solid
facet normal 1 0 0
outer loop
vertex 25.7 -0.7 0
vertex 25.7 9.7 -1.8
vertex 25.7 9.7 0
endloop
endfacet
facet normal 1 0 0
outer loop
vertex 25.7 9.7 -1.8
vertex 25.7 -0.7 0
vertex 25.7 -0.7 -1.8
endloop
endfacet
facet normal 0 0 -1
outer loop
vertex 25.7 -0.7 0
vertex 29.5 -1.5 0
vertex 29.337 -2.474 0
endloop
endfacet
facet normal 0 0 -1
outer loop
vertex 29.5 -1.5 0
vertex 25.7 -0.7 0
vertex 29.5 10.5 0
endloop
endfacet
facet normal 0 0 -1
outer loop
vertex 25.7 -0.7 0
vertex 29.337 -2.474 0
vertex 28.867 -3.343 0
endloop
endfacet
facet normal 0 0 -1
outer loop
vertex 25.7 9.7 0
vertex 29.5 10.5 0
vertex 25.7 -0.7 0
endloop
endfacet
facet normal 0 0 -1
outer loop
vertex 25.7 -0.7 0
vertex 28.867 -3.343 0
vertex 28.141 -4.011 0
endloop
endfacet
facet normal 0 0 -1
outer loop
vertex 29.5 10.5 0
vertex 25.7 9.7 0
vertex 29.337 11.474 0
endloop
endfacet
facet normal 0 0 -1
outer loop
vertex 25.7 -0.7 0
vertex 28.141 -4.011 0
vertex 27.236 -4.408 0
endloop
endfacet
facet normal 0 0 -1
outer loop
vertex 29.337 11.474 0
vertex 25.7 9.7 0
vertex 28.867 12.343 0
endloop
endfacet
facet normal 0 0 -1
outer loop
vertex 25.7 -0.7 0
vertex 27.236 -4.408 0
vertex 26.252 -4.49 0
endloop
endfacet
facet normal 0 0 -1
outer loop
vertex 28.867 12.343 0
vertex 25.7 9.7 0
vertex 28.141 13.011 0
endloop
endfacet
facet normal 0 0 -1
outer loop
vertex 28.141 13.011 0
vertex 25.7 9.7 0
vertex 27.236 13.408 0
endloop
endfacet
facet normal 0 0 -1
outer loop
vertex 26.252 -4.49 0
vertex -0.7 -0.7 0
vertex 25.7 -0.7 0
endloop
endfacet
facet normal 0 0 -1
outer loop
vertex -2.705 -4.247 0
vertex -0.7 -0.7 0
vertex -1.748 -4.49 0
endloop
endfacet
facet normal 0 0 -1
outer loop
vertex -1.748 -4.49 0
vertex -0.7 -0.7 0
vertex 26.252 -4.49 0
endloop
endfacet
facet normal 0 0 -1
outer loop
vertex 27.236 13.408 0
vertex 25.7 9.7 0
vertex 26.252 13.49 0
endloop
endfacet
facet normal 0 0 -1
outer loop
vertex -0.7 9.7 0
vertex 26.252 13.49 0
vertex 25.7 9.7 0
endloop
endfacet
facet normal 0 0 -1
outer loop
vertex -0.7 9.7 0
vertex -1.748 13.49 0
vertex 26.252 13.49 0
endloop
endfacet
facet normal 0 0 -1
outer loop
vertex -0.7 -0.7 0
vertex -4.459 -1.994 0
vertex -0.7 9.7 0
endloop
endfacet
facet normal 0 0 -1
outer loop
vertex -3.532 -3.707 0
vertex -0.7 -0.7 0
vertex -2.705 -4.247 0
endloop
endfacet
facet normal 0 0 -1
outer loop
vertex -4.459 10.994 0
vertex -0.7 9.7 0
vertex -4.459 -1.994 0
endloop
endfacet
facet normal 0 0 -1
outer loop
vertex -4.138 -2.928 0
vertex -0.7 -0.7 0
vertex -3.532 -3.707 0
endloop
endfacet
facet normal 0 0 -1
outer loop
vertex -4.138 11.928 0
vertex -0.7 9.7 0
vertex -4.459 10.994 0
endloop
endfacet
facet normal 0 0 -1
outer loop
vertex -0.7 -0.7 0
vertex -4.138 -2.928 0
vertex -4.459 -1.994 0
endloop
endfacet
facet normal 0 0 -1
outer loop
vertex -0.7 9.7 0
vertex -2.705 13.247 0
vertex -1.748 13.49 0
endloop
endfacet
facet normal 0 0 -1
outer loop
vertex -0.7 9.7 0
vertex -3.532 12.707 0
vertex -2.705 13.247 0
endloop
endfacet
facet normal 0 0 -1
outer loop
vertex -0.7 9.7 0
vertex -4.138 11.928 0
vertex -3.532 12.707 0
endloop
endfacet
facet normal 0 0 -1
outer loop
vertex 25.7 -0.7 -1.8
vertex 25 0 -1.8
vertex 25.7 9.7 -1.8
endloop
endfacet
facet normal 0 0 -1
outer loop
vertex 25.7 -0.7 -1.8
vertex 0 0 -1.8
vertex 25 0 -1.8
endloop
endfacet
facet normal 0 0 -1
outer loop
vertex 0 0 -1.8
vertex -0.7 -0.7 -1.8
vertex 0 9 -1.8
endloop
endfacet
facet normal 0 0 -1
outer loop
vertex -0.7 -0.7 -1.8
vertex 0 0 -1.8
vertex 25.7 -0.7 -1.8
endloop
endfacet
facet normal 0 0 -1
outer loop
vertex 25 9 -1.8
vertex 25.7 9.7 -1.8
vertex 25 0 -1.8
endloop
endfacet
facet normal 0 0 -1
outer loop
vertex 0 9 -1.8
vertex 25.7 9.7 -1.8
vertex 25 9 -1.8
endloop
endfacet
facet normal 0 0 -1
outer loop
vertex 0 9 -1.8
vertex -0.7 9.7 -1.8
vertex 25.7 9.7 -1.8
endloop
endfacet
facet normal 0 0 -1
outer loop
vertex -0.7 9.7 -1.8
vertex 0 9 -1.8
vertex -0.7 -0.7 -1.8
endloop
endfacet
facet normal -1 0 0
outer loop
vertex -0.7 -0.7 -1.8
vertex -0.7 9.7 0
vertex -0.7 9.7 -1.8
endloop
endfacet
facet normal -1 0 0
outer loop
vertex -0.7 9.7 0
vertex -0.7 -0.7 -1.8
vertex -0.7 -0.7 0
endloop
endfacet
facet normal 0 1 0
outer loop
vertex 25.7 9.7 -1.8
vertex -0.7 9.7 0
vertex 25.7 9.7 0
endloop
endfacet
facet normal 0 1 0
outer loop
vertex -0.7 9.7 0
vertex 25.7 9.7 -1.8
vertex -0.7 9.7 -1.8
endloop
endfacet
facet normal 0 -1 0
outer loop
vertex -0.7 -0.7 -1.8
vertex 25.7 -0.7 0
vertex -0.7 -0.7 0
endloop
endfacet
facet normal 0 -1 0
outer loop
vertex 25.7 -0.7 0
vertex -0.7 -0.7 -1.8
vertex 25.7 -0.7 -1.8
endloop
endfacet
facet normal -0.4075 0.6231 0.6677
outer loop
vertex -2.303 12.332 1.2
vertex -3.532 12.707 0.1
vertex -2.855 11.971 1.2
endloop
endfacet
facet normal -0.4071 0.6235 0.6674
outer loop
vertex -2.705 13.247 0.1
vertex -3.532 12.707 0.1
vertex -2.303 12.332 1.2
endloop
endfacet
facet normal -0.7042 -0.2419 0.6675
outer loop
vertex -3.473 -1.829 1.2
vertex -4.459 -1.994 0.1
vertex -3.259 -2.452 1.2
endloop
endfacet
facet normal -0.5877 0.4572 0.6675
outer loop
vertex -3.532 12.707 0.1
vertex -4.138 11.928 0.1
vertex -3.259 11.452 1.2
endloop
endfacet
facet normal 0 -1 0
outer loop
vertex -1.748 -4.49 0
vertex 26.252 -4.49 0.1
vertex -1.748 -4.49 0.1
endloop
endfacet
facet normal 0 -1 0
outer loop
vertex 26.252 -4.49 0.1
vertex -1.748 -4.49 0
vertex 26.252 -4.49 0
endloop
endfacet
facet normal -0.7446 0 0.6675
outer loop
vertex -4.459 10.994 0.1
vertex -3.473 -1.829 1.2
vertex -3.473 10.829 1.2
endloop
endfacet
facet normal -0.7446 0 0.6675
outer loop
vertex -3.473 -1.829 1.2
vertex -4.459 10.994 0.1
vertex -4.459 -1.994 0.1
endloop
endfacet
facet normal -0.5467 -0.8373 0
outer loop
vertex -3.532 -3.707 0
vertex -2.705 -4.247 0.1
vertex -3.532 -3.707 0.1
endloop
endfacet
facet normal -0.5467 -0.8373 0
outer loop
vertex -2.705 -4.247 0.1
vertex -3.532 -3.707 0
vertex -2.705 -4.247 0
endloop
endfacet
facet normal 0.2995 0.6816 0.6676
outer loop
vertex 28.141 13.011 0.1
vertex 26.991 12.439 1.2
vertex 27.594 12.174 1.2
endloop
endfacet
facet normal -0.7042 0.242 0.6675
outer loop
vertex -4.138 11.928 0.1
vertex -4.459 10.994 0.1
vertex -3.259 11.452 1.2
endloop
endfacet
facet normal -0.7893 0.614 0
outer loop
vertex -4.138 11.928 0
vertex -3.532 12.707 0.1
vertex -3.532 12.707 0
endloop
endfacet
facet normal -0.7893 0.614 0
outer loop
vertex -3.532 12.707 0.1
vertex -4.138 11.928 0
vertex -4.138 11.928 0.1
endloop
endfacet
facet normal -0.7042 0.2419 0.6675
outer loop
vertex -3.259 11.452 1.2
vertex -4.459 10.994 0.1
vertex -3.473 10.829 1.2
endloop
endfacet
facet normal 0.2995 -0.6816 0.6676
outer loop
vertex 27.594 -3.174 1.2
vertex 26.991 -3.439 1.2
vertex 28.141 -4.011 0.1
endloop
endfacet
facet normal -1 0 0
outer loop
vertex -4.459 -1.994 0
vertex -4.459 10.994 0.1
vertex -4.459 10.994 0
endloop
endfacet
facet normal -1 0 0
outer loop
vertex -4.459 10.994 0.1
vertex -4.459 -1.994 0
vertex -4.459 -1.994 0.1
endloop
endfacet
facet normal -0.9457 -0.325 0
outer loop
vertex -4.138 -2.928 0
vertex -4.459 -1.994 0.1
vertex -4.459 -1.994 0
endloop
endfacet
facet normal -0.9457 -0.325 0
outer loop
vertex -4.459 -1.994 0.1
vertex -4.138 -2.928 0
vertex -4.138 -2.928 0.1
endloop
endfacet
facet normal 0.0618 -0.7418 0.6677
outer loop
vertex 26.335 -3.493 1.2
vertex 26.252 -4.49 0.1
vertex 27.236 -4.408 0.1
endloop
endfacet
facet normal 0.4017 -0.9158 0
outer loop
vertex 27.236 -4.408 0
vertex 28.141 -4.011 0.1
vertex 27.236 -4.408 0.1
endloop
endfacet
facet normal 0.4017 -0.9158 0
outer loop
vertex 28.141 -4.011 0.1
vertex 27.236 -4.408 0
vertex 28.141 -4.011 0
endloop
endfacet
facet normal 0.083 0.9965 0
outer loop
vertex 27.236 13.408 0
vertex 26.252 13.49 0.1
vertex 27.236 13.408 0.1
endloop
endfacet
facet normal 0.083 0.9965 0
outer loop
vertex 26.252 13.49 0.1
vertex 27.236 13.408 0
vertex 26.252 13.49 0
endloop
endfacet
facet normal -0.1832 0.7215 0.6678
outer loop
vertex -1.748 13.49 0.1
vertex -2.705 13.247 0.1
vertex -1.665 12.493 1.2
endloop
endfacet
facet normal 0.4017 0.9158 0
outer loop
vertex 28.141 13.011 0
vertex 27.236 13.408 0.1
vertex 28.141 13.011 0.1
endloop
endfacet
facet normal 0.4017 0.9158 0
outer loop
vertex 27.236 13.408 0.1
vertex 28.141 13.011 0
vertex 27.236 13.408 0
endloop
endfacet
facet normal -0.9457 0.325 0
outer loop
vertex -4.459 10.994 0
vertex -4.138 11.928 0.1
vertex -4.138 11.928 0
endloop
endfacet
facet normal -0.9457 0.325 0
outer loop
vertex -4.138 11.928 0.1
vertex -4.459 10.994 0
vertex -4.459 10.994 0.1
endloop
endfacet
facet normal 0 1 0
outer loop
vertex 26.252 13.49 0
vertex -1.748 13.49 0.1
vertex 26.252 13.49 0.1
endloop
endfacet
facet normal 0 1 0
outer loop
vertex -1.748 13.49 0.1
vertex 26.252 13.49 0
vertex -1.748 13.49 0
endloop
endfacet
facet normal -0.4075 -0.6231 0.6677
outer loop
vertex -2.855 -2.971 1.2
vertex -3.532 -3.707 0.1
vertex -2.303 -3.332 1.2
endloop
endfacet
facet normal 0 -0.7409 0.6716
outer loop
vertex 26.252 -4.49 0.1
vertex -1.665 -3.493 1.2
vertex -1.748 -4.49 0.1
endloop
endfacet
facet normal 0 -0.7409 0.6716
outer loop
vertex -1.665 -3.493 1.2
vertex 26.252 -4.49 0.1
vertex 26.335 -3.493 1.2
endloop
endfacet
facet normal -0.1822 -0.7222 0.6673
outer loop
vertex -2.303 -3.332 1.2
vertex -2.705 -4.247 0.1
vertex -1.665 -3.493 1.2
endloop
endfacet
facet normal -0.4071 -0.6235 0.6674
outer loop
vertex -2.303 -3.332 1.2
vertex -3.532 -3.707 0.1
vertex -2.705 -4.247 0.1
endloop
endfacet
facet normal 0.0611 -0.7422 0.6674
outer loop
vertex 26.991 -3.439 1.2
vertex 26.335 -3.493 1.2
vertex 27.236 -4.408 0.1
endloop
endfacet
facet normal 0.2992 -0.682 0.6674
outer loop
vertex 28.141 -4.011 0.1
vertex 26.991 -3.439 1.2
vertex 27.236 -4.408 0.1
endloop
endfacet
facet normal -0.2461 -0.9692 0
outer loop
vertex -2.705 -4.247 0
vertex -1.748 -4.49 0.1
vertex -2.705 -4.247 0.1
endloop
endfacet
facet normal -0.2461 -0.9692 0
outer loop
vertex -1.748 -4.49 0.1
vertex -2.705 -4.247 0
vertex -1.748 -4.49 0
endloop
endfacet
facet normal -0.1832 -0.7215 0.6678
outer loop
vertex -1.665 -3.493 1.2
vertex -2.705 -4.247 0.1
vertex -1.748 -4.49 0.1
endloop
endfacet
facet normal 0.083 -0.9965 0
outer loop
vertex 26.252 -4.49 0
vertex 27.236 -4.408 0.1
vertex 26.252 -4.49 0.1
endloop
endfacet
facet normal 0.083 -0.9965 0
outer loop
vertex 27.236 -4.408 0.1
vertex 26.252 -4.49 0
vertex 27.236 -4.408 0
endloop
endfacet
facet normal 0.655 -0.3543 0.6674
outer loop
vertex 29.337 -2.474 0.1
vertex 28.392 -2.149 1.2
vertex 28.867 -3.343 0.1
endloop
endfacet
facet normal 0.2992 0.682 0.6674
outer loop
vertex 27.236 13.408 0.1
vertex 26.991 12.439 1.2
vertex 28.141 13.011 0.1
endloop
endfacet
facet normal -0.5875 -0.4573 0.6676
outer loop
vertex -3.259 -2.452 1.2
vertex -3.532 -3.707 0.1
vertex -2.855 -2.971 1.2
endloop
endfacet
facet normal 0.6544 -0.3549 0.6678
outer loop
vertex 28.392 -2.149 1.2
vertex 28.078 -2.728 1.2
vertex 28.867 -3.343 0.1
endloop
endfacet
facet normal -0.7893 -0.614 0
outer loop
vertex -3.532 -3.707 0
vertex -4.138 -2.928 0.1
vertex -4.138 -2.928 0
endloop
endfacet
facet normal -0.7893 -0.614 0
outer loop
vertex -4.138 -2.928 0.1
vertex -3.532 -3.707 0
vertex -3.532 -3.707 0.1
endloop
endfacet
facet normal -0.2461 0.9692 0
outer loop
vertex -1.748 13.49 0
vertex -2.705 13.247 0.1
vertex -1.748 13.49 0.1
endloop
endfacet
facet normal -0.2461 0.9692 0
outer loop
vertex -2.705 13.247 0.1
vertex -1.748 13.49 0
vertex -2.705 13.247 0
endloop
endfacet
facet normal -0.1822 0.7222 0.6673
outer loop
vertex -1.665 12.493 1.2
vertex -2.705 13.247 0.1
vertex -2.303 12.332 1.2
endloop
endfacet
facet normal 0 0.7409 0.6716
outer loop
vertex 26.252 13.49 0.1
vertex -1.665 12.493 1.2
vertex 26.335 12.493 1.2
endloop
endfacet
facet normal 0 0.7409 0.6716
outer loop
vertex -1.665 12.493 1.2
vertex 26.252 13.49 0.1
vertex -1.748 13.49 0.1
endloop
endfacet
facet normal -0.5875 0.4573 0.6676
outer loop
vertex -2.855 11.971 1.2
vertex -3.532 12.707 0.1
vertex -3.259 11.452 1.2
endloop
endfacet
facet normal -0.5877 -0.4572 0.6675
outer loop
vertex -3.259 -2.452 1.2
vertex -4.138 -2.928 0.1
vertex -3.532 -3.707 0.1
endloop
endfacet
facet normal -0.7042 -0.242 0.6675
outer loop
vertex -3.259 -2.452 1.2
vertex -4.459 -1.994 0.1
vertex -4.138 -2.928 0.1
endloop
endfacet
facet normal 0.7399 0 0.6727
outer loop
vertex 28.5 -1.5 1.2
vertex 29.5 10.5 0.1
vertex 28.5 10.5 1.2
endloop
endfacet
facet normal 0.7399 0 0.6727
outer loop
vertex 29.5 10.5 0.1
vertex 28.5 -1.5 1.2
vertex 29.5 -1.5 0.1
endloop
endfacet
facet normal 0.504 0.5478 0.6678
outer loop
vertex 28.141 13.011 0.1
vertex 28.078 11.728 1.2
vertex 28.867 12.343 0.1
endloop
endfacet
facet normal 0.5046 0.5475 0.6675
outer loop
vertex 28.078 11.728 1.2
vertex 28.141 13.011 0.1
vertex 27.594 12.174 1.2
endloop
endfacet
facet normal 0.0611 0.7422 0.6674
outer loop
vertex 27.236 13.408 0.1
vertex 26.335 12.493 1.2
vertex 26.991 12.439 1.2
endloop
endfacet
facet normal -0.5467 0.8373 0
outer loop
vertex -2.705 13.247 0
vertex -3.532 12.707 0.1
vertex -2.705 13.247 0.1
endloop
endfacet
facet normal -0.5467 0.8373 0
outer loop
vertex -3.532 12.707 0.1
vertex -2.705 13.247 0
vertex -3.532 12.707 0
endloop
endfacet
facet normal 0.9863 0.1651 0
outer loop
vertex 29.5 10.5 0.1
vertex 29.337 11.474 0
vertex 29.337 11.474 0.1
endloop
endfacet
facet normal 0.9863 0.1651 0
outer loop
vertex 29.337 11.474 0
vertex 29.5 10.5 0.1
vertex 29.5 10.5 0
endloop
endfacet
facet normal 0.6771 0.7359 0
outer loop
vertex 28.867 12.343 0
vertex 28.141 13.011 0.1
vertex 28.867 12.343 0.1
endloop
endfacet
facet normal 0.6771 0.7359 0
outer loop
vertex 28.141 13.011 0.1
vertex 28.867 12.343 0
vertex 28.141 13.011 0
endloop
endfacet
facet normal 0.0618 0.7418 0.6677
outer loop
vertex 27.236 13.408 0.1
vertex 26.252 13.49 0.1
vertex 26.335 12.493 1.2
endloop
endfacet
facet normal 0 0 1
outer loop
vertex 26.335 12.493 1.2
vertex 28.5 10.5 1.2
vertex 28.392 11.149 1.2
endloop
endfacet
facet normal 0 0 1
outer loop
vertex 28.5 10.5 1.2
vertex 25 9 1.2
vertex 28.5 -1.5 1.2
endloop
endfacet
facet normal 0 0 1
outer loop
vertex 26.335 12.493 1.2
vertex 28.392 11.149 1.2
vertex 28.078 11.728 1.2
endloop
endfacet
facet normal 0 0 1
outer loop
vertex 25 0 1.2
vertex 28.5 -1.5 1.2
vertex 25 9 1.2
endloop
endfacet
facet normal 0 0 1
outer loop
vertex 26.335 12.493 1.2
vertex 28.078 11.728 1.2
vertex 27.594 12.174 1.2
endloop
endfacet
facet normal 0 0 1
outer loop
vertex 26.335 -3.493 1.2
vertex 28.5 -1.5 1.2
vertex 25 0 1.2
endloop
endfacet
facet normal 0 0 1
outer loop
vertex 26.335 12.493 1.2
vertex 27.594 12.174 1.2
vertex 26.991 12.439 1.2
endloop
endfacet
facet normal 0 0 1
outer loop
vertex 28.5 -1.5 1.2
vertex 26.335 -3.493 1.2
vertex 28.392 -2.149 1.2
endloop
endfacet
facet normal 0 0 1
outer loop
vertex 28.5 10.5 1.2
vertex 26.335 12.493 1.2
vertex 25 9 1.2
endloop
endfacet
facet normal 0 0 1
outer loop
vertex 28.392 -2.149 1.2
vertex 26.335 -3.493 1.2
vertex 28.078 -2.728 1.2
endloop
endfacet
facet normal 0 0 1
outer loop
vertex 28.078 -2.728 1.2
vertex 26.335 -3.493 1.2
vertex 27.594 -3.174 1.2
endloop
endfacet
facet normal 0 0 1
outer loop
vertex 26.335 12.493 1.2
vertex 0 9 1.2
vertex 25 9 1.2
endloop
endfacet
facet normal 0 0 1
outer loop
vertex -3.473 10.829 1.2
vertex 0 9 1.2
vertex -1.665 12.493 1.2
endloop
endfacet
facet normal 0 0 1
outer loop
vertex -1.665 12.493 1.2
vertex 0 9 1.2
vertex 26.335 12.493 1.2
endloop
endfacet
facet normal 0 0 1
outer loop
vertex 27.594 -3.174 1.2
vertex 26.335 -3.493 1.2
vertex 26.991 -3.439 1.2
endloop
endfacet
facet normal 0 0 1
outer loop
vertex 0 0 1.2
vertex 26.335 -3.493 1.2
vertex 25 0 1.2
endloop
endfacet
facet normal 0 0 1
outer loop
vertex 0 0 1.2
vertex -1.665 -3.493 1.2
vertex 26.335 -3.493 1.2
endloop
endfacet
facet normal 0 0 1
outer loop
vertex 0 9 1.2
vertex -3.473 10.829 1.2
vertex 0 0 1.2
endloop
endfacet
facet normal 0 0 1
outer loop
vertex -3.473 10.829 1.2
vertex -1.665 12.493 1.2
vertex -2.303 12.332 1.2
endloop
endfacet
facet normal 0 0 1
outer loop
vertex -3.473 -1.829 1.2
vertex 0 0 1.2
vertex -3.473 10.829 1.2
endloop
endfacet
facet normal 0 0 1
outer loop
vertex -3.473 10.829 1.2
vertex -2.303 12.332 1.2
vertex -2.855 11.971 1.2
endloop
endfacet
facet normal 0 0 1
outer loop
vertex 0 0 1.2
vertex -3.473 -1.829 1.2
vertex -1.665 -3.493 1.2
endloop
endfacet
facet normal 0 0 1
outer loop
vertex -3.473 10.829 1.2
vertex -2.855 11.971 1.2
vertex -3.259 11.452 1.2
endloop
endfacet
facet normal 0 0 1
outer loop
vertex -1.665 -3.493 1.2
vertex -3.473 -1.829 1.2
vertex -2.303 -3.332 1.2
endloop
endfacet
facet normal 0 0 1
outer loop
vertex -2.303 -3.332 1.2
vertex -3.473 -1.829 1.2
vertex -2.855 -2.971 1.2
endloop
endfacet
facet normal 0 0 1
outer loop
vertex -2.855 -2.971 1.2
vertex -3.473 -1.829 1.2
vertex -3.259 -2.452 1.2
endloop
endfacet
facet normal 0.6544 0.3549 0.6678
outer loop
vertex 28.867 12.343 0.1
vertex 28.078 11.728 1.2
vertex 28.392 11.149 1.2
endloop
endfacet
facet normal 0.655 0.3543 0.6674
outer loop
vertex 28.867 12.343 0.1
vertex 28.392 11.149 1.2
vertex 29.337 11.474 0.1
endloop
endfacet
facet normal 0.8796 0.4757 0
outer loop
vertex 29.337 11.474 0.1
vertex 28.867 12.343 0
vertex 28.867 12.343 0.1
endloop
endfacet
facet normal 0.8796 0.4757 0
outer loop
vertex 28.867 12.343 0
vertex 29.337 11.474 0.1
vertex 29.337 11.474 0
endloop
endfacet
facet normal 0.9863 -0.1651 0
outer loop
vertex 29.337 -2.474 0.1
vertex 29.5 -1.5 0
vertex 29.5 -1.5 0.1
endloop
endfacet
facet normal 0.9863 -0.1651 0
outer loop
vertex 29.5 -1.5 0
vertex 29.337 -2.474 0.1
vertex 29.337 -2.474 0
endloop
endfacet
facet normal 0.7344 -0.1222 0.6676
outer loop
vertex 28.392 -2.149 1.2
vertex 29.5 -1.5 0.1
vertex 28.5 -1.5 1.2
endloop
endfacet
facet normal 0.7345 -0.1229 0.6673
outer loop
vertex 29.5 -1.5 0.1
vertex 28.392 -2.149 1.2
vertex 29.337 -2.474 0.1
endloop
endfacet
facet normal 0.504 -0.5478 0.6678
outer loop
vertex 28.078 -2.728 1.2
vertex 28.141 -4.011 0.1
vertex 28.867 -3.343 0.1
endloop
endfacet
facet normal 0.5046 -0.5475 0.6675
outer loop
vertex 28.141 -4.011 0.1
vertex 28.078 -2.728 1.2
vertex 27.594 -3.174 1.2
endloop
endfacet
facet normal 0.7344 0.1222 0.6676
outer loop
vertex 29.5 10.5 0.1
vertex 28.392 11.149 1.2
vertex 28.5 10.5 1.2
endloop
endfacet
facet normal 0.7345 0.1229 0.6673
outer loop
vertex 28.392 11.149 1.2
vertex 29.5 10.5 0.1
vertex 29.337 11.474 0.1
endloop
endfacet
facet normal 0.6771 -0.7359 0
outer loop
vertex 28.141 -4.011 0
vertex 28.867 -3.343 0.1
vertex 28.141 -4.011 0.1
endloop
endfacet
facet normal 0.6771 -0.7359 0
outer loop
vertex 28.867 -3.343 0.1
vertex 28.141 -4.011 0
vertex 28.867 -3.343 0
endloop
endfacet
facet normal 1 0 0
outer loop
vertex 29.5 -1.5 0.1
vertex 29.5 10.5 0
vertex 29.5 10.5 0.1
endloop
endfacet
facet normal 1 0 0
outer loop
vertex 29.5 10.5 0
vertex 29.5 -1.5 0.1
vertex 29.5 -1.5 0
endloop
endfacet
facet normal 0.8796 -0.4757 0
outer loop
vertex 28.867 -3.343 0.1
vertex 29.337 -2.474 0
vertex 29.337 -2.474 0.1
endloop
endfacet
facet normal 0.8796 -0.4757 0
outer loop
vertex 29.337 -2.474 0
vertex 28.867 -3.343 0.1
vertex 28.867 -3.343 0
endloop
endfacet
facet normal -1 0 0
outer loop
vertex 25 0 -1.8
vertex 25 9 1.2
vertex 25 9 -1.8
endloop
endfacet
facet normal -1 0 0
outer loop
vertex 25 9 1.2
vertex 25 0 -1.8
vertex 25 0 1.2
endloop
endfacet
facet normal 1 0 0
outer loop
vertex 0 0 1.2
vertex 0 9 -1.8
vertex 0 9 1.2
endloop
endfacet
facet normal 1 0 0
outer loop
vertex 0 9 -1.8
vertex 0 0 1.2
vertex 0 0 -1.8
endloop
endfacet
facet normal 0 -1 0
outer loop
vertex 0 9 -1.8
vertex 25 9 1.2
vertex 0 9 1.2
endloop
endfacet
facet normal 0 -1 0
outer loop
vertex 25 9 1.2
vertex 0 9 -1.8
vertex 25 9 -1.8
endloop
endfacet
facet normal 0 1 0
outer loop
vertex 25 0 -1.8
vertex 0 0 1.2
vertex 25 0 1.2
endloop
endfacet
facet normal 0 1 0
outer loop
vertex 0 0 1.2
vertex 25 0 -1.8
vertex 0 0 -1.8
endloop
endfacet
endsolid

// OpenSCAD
inner_dx = 25.0;
inner_dy = 9.0;
outer_dx = inner_dx + 7.0;
outer_dy = inner_dy + 7.0;
bezel_dz = 1.2;
sleeve_wall = 0.7;
sleeve_dx = inner_dx + 2 * sleeve_wall;
sleeve_dy = inner_dy + 2 * sleeve_wall;
sleeve_dz = 1.8;

bezel_r1 = 3;
bezel_r2 = 2;

$fa = 1;
$fs = 1;


small = 0.1;

module sleeve()
{
  translate([-sleeve_wall,-sleeve_wall,-sleeve_dz])
  {
    cube([sleeve_dx,sleeve_dy,sleeve_dz]);
  }
}

module negative()
{
  translate([0,0,-sleeve_dz-small]) {
    cube([inner_dx, inner_dy, sleeve_dz+bezel_dz+2*small]);
  }
}

module bezel()
{
  translate([-(outer_dx-inner_dx-bezel_r2*2)/2,-(outer_dy-inner_dy-bezel_r2*2)/2,0]) 
  {
    minkowski()
    {
      cube([outer_dx-bezel_r2*2, outer_dy-bezel_r2*2, small]);
      cylinder(r1=bezel_r1,r2=bezel_r2,h=bezel_dz-small);
    }
  }
}


difference()
{ 
  union()
  {
    sleeve();
    bezel();
  }
  negative();
}
